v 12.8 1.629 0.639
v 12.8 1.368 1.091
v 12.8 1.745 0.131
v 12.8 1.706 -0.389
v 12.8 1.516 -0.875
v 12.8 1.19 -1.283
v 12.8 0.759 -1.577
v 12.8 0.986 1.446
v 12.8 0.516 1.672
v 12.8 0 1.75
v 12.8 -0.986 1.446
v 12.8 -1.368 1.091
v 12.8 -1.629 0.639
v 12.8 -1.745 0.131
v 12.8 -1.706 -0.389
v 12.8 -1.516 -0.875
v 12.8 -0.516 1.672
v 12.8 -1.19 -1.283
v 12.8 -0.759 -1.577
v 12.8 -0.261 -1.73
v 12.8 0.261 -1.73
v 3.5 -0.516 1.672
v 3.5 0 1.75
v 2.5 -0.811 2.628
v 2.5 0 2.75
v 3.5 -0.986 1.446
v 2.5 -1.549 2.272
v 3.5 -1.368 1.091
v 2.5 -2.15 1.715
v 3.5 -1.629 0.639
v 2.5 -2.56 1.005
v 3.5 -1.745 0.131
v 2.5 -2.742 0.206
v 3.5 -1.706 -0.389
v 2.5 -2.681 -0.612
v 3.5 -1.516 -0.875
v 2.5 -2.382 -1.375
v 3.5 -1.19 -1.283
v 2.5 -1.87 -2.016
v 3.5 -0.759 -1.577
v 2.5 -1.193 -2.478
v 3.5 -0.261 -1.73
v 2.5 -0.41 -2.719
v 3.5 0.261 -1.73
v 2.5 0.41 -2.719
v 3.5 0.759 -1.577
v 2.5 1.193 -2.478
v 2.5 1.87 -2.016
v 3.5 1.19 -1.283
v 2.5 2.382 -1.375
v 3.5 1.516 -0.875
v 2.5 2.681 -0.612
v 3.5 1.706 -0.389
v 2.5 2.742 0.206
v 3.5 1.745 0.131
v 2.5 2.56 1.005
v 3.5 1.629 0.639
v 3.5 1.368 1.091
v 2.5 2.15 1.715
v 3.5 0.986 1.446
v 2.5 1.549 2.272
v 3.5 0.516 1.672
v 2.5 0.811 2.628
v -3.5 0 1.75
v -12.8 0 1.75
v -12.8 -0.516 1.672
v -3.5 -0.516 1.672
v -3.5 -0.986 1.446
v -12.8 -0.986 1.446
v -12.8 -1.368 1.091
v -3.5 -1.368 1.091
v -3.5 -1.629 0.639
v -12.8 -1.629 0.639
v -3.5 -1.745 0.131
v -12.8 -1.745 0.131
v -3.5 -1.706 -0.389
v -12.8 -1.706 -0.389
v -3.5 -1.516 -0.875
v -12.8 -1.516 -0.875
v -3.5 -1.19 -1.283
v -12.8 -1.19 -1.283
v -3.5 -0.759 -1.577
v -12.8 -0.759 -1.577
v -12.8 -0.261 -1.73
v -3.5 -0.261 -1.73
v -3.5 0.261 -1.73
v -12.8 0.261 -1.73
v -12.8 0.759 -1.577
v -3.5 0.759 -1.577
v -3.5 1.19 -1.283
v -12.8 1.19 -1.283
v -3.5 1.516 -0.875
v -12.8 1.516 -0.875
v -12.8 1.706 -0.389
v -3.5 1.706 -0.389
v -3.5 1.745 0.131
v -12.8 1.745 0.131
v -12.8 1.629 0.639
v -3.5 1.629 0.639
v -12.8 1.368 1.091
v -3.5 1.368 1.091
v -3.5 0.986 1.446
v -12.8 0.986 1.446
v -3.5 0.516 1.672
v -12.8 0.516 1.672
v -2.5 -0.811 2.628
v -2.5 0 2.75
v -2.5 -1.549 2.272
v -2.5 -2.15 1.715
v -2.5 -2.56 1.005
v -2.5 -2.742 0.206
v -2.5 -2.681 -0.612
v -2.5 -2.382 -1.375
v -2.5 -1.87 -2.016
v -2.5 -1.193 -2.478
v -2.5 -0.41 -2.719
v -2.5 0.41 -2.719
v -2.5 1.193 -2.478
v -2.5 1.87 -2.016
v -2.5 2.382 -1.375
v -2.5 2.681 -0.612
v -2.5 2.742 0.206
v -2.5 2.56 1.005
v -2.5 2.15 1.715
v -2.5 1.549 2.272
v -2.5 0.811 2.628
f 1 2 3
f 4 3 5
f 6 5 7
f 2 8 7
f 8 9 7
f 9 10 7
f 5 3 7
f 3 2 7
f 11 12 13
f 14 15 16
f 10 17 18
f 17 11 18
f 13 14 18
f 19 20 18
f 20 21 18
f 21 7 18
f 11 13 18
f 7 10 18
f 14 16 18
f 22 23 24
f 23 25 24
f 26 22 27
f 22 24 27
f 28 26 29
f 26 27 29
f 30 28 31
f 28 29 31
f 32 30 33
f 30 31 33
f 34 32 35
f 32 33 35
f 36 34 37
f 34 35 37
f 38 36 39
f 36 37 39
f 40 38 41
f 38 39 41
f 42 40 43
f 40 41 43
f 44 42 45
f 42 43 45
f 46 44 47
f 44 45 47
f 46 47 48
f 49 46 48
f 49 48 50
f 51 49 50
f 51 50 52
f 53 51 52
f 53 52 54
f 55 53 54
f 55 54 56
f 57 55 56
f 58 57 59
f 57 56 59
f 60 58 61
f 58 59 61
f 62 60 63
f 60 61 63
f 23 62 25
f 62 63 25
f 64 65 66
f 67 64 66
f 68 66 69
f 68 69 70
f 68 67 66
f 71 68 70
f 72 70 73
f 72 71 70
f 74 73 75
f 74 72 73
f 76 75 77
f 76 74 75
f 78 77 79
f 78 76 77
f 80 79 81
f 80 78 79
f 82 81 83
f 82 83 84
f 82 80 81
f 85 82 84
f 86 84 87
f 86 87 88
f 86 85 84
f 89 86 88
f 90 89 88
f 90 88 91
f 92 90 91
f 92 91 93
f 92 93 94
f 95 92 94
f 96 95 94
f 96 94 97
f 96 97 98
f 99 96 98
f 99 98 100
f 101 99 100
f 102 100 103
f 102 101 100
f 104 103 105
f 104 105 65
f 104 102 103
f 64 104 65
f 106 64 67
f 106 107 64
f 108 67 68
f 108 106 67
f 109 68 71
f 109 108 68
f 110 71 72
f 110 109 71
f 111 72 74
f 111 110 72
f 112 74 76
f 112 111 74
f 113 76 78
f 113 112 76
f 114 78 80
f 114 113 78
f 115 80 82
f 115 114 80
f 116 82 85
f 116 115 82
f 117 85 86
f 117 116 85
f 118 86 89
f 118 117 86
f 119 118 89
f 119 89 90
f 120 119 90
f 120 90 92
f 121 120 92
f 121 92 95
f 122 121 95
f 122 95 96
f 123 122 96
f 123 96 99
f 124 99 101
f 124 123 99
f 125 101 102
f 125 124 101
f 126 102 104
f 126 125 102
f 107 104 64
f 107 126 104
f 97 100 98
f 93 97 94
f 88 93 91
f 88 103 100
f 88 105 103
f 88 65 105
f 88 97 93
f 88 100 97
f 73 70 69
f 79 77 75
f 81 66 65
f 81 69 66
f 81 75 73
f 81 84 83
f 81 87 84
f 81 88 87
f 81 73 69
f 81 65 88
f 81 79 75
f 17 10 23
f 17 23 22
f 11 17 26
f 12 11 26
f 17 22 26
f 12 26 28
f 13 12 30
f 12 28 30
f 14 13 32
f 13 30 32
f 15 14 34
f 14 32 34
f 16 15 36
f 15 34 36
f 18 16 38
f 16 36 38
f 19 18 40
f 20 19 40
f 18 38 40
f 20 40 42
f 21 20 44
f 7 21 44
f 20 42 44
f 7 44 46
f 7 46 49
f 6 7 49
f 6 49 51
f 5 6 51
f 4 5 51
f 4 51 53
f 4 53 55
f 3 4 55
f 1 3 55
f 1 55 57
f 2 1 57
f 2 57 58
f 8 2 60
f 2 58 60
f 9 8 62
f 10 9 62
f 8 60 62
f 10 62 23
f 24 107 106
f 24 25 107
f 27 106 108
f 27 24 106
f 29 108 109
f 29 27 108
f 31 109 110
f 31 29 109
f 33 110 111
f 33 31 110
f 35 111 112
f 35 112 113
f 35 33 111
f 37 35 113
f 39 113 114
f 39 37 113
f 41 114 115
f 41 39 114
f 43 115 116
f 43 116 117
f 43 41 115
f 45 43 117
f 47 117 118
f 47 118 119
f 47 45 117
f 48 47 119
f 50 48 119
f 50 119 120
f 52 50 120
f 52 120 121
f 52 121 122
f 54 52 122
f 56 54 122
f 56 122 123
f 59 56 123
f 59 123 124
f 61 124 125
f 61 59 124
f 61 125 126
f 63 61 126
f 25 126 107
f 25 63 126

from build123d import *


with BuildPart() as part:
    # Sketch2 → Revolve1 (revolve)
    with BuildSketch(Plane.XY, mode=Mode.PRIVATE) as revolve1_sk:
        Polygon((12.8, 0), (12.8, 1.75), (3.5, 1.75), (2.5, 2.75), (0, 2.75), (0, 0), align=None)
    revolve1 = revolve(revolve1_sk.sketch.rotate(Axis((-20, 0, 0), (1, 0, 0)), 90), axis=Axis((-20, 0, 0), (1, 0, 0)))

    # Mirror1: Revolve1 across plane
    add(revolve1.mirror(Plane(origin=(0, 0, 0), x_dir=(0, 0, 1), z_dir=(1, 0, 0))))


solid = part.part
